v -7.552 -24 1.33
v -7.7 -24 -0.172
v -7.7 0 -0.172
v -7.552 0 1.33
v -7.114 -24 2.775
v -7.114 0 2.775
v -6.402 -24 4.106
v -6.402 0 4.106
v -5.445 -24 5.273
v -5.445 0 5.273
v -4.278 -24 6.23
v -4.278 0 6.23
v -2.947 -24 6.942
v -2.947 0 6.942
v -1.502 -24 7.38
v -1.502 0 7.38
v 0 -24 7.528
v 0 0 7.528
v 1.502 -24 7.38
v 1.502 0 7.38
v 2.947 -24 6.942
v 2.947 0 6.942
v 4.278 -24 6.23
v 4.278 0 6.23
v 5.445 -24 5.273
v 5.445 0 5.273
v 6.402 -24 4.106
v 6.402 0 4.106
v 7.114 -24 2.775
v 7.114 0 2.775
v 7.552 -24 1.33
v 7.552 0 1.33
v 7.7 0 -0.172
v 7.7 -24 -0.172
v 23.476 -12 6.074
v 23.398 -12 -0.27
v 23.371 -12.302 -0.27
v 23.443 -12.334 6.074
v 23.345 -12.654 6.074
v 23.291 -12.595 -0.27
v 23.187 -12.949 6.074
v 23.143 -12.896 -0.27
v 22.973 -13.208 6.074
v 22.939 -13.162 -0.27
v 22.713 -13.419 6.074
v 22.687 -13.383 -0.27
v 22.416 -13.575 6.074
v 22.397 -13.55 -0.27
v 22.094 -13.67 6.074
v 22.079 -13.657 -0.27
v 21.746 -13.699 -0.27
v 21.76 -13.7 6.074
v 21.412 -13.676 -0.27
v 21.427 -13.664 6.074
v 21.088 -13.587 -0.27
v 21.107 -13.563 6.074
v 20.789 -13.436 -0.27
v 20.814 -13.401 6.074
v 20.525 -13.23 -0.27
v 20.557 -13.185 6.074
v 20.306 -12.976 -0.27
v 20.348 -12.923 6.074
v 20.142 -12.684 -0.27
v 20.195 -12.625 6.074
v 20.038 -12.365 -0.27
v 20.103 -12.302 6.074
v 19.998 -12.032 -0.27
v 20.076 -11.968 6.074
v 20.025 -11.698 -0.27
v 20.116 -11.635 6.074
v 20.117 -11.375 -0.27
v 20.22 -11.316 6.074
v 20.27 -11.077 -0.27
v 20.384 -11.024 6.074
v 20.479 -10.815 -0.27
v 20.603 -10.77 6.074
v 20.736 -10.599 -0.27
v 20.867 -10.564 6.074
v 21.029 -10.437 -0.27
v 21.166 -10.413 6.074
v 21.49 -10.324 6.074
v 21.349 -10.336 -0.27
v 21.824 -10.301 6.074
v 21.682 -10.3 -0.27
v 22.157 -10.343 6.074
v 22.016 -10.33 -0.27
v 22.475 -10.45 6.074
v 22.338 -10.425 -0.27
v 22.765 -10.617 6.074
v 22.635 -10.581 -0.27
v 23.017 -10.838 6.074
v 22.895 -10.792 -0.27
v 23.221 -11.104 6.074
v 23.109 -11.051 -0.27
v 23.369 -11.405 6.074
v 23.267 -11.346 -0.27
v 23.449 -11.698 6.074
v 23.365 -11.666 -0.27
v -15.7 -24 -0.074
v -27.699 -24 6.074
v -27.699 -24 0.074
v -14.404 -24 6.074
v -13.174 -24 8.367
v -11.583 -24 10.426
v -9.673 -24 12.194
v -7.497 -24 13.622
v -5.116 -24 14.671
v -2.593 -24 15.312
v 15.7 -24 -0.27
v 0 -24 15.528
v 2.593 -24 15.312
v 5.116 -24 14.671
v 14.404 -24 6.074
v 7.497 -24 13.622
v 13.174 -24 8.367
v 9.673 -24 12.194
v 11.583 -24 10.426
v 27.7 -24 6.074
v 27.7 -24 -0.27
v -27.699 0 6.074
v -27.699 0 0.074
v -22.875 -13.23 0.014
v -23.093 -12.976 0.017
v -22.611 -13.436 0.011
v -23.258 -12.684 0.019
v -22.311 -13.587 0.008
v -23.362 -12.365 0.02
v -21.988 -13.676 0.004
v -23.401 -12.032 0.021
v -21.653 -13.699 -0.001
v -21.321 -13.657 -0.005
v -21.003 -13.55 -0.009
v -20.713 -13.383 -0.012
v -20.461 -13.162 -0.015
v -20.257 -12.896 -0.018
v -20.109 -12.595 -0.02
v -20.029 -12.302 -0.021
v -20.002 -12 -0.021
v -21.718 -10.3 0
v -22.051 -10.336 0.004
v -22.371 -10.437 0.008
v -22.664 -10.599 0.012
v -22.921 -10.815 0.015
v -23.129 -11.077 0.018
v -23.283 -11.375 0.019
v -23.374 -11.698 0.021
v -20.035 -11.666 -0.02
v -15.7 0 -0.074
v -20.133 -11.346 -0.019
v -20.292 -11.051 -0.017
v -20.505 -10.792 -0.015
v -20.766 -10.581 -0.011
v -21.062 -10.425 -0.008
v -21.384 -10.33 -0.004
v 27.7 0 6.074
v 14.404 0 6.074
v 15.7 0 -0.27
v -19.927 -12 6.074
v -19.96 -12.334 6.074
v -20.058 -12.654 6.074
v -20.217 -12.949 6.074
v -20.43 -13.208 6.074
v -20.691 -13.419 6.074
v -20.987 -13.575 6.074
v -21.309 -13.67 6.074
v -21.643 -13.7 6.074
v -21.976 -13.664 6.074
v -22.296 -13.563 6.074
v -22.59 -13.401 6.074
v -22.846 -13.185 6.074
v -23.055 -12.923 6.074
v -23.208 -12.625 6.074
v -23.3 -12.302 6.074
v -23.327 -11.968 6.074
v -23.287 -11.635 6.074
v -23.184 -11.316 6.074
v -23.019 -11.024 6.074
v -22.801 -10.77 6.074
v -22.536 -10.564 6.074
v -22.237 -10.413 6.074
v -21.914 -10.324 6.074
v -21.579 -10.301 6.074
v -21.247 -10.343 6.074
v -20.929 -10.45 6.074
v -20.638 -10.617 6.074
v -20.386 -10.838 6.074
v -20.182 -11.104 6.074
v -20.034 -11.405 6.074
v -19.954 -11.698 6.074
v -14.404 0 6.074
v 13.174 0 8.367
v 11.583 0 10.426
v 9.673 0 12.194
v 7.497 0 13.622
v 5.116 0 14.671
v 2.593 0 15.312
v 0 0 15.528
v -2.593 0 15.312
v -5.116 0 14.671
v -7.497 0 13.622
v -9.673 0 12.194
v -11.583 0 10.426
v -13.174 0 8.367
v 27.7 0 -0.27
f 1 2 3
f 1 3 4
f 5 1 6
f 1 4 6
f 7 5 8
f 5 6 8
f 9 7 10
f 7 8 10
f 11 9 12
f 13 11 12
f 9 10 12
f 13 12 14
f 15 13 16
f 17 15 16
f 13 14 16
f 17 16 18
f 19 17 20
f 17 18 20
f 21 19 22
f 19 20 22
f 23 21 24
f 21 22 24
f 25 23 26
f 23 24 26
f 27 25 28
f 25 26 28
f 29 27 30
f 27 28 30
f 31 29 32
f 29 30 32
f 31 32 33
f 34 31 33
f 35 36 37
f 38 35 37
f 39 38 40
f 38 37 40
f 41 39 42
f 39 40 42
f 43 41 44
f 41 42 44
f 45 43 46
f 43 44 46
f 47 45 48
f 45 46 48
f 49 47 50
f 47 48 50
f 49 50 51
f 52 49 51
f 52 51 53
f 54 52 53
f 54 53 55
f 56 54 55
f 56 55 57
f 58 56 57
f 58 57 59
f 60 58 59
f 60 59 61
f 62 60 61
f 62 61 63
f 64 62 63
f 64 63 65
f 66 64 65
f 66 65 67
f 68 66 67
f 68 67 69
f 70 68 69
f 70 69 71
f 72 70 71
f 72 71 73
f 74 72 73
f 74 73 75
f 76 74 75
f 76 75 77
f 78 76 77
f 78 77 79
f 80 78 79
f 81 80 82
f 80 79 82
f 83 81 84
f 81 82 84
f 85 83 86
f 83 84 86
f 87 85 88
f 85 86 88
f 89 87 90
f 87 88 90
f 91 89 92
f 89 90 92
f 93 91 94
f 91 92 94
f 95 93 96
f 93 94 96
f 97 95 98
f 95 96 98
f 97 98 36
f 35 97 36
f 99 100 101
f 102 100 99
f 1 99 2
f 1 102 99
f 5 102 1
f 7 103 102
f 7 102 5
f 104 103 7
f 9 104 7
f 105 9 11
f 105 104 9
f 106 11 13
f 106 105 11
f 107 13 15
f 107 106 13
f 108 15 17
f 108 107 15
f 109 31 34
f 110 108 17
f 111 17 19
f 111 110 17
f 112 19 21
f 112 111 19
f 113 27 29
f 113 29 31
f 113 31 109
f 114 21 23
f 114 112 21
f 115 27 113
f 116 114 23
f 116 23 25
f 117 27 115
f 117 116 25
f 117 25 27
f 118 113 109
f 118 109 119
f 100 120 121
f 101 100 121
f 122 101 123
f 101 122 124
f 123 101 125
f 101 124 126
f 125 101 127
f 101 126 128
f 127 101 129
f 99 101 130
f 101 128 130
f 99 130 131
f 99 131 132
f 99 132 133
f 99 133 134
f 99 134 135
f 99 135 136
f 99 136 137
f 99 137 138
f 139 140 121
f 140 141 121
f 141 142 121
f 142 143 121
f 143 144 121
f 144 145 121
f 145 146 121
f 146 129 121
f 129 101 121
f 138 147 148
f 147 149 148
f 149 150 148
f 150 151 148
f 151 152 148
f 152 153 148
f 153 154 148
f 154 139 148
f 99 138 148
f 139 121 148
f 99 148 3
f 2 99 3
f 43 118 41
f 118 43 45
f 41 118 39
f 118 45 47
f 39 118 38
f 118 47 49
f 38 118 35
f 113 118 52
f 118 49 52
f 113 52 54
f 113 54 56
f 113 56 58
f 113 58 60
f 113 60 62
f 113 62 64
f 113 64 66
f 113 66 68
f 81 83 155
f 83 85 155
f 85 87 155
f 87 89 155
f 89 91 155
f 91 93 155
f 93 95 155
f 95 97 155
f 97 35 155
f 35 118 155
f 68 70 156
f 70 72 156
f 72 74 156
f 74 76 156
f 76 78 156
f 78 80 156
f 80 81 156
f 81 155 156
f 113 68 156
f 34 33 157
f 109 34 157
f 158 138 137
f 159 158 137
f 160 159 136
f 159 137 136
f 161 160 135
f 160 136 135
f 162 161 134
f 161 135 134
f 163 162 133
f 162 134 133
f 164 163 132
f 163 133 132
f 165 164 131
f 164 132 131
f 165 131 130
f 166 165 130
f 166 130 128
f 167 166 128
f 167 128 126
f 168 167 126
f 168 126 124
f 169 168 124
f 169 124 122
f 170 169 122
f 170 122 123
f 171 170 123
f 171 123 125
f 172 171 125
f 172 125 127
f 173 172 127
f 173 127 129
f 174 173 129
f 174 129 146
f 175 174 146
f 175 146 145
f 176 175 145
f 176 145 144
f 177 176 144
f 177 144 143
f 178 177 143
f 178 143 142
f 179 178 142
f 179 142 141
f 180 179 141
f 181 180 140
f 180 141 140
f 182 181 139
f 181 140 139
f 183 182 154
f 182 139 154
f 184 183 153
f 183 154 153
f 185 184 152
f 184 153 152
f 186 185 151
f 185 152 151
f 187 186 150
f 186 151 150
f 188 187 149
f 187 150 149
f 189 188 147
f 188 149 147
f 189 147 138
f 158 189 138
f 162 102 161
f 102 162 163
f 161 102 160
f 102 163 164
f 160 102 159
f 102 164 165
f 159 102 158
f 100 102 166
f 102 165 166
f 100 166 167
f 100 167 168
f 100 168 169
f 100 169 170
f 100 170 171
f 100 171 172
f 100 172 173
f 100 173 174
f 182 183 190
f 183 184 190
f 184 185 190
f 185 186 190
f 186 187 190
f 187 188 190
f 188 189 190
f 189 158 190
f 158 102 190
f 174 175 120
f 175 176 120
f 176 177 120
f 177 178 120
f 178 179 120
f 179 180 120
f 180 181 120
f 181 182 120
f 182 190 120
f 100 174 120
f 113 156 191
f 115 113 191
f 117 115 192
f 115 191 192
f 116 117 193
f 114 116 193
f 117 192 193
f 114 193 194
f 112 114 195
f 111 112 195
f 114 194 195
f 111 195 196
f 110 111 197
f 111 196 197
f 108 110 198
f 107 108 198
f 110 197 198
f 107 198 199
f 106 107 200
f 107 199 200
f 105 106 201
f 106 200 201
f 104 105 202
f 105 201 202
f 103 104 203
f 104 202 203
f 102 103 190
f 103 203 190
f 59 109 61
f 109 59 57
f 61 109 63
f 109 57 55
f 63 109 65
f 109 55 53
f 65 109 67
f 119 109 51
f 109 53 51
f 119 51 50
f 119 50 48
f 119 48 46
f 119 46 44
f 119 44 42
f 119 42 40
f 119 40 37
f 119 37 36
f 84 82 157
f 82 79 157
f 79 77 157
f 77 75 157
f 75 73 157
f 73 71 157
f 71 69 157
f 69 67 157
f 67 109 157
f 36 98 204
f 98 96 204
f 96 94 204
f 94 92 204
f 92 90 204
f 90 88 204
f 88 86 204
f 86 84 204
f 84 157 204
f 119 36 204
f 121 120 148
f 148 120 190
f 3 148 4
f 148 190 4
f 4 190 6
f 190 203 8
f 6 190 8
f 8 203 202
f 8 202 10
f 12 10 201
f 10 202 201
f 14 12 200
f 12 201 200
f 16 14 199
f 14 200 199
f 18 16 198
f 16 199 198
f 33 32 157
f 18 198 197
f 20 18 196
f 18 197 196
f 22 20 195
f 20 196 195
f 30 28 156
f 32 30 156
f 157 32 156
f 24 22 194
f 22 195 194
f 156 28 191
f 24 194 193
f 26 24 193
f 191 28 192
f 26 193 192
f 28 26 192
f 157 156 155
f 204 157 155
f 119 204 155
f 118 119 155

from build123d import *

# Parameters (mm, degrees)
F1_DEPTH = 24
F2_R     = 1.7
F3_DEPTH = 25


with BuildPart() as f1:
    # F0 (on Front) → F1 (new body)
    with BuildSketch(Plane.XZ):
        with BuildLine():
            ThreePointArc((-7.7, -0.172106), (0, 7.527894), (7.7, -0.172106))
            Line((7.7, -0.172106), (15.699692, -0.270456))
            Line((15.699692, -0.270456), (27.699692, -0.270456))
            Line((27.699692, -0.270456), (27.699692, 6.073763))
            Line((27.699692, 6.073763), (14.404135, 6.073763))
            ThreePointArc((14.404135, 6.073763), (0, 15.527894), (-14.404135, 6.073763))
            Line((-14.404135, 6.073763), (-27.698785, 6.073763))
            Line((-27.698785, 6.073763), (-27.698785, 0.073763))
            Line((-27.698785, 0.073763), (-15.699692, -0.073756))
            Line((-15.699692, -0.073756), (-7.7, -0.172106))
        make_face()
    extrude(amount=F1_DEPTH)

    # F2 (on face) → F3 (cut)
    with BuildSketch(Plane(origin=(-0.003279, 0, -0.266731), x_dir=(0.999924, 0, -0.012293), z_dir=(-0.012293, 0, -0.999924))):
        with Locations((-21.7, 12)):
            Circle(F2_R)
        with Locations((21.7, 12)):
            Circle(F2_R)
    extrude(amount=-F3_DEPTH, mode=Mode.SUBTRACT)


solid = f1.part
